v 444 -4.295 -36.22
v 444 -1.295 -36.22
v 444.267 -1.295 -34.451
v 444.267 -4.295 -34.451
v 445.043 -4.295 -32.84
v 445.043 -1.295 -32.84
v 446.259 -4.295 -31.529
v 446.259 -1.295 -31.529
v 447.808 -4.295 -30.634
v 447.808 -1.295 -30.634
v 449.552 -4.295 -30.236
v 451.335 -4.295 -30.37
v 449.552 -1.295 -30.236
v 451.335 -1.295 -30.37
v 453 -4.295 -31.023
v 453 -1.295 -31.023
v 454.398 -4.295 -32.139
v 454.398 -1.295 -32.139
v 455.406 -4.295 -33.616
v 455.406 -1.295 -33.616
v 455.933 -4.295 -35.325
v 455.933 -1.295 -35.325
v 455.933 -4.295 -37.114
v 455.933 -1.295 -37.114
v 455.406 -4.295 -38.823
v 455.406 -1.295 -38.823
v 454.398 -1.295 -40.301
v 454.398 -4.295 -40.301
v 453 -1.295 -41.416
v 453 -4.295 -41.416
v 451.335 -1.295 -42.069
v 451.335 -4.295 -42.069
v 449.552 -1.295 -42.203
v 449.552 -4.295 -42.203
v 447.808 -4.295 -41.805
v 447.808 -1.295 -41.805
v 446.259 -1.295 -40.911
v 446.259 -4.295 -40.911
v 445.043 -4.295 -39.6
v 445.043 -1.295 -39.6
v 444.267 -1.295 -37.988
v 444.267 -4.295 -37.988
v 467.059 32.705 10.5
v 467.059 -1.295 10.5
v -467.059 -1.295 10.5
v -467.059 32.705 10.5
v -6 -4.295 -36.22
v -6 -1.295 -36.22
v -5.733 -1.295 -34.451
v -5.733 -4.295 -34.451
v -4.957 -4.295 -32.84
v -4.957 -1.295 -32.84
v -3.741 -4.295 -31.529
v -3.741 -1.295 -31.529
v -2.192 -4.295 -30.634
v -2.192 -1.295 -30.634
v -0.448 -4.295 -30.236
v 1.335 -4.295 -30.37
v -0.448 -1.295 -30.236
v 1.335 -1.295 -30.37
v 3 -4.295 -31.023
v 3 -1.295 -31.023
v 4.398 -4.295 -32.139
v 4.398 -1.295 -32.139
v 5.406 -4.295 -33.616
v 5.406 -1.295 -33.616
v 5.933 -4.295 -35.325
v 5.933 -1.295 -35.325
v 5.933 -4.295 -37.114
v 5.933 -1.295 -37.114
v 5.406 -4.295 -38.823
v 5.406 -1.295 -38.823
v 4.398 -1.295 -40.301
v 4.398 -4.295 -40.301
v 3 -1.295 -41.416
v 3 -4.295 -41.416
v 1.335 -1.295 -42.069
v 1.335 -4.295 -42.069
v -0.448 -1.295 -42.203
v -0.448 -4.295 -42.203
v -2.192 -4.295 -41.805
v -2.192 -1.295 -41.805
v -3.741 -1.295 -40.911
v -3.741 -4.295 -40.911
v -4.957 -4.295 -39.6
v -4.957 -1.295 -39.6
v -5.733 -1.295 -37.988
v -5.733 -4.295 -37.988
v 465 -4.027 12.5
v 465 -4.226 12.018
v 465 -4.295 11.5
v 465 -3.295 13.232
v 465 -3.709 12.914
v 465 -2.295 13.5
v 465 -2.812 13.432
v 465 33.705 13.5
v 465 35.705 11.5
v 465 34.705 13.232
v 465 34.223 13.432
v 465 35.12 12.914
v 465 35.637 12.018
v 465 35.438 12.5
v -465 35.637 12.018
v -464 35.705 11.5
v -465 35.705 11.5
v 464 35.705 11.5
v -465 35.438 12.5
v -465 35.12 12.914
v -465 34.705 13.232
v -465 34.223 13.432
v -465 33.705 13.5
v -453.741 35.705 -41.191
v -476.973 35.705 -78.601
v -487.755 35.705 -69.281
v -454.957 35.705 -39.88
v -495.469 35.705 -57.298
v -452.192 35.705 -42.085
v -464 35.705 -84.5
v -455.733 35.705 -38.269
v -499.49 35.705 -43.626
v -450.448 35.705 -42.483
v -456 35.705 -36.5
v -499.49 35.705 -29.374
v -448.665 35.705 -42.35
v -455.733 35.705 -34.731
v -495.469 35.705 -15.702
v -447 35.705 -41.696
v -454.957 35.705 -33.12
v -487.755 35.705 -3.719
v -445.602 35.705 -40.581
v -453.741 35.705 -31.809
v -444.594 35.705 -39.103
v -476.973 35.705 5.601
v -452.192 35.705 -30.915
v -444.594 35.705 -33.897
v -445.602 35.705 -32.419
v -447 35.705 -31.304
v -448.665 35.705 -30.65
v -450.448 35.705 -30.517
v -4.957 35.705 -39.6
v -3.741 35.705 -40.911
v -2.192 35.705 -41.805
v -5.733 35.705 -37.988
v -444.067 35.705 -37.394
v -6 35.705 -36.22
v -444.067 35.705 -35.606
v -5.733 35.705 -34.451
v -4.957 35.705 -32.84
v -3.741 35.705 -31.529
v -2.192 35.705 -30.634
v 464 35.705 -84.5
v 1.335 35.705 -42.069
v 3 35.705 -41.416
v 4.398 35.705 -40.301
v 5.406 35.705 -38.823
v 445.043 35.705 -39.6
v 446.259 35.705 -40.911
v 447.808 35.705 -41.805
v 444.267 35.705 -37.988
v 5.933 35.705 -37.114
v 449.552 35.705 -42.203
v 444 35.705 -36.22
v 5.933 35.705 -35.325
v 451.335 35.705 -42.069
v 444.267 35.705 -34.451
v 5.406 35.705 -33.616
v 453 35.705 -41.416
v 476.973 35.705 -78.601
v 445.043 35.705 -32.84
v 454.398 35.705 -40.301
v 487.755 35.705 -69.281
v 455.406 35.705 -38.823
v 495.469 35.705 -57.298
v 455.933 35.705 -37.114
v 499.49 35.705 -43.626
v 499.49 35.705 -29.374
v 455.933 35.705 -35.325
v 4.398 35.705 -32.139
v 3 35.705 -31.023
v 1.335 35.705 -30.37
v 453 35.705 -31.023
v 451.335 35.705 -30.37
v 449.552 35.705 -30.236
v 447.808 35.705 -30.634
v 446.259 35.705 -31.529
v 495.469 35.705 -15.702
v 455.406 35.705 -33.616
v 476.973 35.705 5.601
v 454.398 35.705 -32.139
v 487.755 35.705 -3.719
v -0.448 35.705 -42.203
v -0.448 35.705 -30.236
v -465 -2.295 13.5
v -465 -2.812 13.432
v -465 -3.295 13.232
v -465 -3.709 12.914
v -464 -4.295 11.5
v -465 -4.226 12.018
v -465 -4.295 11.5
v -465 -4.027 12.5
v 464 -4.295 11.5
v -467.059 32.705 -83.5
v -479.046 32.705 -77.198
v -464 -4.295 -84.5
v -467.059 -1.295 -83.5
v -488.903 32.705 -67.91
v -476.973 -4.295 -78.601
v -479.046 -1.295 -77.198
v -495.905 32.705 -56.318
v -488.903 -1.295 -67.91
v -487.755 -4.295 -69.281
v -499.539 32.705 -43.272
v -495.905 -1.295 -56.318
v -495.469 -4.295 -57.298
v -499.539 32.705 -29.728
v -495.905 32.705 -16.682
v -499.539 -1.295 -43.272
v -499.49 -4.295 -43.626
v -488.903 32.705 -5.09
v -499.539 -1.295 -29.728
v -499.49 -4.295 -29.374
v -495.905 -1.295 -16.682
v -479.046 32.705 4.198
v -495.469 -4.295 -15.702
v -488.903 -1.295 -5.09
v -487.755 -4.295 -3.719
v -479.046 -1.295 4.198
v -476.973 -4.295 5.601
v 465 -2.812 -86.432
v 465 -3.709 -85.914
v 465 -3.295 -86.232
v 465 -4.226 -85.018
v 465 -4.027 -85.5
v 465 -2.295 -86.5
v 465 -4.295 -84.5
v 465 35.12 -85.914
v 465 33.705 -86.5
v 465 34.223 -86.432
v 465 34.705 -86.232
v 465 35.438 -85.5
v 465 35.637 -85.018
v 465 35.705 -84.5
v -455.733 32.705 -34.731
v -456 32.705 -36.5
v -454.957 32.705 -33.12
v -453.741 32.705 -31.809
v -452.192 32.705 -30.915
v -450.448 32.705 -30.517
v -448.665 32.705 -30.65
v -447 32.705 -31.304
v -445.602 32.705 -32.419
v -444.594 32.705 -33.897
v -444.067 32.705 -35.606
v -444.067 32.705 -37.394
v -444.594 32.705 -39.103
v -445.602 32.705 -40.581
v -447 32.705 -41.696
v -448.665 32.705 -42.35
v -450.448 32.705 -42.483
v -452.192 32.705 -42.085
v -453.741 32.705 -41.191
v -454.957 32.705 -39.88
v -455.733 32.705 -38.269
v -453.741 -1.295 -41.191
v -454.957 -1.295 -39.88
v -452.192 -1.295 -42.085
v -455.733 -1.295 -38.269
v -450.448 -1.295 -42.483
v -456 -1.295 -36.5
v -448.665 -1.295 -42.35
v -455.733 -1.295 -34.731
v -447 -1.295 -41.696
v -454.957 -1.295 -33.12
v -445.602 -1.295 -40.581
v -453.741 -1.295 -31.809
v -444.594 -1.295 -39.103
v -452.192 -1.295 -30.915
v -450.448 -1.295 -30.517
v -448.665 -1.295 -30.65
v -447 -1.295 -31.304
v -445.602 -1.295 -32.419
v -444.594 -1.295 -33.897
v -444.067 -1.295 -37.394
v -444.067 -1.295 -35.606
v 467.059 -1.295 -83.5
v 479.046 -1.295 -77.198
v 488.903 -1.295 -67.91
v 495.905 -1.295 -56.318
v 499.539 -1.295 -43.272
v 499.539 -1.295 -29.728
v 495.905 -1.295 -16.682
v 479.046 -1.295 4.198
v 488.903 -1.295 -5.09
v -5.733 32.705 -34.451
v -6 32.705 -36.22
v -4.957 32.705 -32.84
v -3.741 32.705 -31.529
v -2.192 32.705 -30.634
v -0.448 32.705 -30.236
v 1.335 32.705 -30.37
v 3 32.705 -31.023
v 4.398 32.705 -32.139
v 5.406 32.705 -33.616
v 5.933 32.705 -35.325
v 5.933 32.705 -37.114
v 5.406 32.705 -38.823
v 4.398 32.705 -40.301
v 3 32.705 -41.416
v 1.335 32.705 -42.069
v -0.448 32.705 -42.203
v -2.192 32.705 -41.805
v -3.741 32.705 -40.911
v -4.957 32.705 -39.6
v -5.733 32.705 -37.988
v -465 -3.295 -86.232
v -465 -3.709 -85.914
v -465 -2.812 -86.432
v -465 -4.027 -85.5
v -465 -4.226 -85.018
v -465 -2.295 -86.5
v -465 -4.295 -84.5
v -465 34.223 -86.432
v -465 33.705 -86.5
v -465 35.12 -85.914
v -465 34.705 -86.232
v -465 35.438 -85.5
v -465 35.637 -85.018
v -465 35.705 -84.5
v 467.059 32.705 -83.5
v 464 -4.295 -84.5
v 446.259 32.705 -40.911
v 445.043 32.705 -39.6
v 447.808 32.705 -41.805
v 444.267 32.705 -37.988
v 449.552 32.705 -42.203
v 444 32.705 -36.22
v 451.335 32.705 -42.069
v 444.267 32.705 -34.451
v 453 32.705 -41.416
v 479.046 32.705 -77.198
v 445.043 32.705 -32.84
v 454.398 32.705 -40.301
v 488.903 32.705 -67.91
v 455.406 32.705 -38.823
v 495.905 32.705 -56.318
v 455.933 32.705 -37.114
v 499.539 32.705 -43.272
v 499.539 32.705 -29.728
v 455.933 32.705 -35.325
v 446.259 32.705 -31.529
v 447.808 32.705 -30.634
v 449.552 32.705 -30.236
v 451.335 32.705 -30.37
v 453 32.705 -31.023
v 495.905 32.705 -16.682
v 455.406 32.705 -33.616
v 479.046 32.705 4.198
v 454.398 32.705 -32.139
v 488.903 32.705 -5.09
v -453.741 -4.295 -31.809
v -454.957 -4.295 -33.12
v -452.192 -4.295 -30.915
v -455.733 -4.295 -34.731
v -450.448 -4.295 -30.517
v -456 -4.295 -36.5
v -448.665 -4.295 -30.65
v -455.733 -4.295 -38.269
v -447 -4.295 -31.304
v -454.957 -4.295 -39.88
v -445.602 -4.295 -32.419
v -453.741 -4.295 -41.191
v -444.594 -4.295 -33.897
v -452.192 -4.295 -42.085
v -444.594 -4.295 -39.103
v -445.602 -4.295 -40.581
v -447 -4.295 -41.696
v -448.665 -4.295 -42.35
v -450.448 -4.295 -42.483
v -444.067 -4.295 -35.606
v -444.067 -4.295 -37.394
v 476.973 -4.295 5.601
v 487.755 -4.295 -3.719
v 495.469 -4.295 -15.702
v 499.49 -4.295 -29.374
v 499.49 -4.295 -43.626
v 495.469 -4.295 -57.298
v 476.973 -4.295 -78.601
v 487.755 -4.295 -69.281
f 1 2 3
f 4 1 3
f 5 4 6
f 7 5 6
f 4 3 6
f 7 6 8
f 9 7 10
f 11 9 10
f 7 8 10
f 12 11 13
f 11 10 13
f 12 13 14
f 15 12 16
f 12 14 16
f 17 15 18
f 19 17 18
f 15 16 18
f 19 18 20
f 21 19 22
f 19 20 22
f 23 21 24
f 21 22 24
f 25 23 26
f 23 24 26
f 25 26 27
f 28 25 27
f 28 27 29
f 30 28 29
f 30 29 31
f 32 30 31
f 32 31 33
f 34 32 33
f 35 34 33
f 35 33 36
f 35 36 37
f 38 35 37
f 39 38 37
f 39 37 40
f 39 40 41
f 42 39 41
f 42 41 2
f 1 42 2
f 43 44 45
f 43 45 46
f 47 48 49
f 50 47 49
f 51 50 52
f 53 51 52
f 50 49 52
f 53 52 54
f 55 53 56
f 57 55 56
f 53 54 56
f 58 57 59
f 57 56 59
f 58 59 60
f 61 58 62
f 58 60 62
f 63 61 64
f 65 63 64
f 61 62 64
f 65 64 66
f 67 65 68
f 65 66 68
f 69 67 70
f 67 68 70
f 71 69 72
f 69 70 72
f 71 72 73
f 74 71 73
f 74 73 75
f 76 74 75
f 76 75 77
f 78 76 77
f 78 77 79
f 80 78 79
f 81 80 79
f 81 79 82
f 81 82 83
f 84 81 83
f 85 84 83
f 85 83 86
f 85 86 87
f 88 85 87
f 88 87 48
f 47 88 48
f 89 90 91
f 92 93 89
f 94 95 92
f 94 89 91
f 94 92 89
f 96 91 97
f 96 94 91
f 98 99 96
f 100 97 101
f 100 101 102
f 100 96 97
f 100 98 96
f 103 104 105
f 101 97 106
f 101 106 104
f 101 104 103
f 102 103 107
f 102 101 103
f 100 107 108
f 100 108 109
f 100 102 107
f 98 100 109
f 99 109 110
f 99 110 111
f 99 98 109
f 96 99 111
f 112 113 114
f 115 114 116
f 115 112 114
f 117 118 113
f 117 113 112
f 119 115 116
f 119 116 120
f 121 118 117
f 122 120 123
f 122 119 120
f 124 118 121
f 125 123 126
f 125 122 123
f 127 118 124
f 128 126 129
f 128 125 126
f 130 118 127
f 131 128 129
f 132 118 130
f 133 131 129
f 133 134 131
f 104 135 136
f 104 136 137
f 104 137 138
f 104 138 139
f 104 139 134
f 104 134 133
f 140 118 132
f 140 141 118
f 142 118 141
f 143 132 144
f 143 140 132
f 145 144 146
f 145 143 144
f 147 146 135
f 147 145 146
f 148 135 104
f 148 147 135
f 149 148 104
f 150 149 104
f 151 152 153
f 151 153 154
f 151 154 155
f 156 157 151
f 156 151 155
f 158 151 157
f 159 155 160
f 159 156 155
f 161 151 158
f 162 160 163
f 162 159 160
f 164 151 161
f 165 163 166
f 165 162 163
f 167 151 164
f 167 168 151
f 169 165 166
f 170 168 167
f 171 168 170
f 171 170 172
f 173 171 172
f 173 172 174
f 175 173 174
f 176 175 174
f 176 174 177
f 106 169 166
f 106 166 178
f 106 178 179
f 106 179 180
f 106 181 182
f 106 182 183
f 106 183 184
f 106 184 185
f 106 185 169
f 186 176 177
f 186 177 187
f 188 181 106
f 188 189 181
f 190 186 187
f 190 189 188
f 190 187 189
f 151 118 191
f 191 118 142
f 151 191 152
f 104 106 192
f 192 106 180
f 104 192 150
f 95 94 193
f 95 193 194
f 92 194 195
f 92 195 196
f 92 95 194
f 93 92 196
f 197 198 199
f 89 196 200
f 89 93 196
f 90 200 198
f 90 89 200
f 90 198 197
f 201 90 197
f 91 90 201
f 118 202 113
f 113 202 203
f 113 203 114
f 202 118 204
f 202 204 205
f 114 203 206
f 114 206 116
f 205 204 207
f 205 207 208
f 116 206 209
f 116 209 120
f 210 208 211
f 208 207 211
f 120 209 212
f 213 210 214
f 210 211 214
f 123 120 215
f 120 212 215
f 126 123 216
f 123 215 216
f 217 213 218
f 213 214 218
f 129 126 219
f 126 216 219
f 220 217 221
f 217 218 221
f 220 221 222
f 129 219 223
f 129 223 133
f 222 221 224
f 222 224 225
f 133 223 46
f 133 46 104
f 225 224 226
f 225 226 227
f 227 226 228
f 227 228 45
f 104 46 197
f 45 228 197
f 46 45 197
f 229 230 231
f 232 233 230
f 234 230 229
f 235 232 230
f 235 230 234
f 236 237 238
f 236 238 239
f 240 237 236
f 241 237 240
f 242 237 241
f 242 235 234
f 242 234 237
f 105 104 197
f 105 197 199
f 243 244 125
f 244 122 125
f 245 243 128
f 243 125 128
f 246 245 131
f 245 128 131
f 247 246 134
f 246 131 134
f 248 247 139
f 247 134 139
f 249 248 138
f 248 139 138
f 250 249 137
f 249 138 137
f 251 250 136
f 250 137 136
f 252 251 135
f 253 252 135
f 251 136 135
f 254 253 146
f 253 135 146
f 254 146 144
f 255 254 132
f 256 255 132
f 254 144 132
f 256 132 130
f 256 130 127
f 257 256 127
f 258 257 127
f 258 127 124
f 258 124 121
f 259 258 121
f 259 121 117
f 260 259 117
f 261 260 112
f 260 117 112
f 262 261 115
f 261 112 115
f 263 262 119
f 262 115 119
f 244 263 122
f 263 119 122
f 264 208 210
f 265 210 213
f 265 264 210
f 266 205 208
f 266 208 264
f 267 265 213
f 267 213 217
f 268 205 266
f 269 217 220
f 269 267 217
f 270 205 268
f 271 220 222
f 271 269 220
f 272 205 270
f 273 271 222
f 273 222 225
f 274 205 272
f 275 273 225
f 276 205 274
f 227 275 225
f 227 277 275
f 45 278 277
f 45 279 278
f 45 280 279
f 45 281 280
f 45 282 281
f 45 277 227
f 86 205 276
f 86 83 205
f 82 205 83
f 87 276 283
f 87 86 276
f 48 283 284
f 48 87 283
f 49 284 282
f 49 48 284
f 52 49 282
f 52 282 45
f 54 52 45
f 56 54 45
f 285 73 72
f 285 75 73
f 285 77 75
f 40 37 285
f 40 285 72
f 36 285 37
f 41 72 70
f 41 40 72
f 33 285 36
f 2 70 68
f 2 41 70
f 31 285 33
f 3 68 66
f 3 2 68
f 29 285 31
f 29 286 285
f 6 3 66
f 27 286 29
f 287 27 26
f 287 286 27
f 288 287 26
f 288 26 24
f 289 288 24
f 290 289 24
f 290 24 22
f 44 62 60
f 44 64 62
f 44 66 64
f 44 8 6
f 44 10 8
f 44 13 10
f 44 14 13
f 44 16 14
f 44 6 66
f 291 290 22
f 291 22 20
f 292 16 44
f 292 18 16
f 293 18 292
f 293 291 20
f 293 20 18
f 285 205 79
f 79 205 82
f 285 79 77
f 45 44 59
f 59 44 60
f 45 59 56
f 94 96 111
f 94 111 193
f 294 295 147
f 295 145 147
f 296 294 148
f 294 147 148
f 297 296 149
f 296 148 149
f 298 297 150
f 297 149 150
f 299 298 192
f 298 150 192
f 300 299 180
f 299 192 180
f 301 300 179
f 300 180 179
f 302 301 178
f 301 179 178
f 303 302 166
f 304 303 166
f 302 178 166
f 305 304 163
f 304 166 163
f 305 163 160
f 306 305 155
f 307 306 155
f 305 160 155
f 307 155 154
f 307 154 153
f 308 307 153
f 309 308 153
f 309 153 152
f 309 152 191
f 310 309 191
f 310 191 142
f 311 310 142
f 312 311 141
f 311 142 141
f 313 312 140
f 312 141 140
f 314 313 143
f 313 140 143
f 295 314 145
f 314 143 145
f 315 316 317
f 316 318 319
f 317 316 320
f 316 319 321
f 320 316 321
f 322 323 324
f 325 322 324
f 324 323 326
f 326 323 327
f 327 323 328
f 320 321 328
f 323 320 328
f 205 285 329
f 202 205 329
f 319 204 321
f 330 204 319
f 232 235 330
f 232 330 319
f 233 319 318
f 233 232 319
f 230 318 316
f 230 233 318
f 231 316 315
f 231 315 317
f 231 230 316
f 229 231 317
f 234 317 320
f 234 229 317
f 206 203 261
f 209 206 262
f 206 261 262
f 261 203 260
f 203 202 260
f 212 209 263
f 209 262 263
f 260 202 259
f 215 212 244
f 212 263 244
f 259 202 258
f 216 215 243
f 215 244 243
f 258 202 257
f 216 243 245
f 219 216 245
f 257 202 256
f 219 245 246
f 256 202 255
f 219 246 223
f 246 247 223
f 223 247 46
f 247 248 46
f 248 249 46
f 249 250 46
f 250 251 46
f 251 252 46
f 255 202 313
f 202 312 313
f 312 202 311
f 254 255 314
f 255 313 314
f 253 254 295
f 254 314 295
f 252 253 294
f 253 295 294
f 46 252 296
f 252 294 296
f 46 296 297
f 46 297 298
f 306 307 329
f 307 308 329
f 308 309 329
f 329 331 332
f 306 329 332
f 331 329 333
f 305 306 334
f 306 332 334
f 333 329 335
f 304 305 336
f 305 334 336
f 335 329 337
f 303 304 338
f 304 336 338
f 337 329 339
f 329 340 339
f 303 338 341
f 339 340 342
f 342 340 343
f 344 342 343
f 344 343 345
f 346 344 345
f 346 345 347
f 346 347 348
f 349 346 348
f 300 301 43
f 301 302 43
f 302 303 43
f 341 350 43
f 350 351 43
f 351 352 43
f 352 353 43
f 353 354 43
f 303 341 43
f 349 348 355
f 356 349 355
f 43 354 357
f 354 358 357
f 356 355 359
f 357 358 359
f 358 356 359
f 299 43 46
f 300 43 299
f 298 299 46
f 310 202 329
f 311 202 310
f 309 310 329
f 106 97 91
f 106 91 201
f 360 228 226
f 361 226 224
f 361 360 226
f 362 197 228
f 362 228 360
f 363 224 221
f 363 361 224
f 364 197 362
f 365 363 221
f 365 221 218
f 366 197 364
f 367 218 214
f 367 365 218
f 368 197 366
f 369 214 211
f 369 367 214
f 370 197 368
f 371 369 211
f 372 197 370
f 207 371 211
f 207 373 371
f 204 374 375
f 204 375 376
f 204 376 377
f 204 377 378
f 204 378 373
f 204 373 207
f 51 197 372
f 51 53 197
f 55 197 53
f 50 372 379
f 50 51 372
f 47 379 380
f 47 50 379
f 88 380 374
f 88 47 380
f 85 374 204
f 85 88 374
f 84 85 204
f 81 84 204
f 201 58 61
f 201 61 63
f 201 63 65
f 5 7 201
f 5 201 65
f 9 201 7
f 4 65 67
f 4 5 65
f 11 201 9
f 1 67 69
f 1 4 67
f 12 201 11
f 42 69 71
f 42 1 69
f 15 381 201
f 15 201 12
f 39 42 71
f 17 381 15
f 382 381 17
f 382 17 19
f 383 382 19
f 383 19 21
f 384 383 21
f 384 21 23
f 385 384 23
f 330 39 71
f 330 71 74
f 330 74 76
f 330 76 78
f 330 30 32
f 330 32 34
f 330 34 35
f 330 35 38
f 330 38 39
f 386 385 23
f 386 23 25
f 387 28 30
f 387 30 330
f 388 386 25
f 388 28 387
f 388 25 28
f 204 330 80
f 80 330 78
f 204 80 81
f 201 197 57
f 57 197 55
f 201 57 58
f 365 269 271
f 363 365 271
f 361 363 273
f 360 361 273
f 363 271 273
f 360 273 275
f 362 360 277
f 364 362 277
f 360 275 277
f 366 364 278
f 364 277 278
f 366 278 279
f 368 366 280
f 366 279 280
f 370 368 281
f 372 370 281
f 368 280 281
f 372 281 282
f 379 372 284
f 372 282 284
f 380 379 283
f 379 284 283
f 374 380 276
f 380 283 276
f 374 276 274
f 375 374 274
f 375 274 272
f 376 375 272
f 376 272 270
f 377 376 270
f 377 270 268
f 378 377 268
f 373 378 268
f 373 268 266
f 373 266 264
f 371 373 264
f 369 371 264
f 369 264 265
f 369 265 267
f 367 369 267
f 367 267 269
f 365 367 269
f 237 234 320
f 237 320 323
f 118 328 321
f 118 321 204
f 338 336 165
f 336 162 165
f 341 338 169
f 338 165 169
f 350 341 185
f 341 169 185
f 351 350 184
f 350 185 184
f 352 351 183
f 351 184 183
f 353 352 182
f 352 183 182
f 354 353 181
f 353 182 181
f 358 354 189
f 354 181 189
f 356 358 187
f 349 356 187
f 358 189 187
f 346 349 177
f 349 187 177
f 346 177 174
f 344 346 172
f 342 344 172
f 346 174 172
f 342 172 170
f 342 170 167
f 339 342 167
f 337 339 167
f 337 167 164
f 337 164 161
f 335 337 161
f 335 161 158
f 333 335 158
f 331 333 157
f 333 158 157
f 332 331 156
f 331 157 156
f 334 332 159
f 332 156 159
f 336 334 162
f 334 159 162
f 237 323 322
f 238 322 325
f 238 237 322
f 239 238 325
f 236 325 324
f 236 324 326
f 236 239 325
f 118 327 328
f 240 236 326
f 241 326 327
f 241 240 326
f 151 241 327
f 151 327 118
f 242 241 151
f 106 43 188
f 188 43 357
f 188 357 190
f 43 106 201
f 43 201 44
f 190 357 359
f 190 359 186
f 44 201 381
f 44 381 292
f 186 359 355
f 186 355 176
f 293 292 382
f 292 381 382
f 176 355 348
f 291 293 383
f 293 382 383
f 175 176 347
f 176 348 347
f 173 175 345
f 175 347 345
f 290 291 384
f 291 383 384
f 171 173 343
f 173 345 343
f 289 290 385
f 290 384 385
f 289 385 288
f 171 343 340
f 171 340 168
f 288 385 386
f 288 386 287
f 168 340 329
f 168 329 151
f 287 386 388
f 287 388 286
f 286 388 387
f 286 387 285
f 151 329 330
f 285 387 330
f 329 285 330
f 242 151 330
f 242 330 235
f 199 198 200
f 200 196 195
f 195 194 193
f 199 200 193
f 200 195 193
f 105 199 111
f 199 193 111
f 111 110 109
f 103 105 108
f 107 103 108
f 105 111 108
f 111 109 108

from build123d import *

# Parameters (mm, degrees)
F3_W     = 34
F3_H     = 94
F4_DEPTH = 500
F6_D     = 12
F6_DEPTH = 40
F6_TIP   = 3.6051637142
F7_DEPTH = 40
F8_DEPTH = 35
F9_DEPTH = 35


# Not quite as in the source:
# - a feature names something its author has since deleted; it is built from what else it names


with BuildPart() as f4:
    # F3 (on Right) → F4 (new body, symmetric)
    with BuildSketch(Plane.YZ):
        with BuildLine():
            ThreePointArc((-4.2945303673, -84.5), (-3.7087439297, -85.9142135624), (-2.2945303673, -86.5))
            Line((-2.2945303673, -86.5), (33.7054696327, -86.5))
            ThreePointArc((33.7054696327, -86.5), (35.1196831951, -85.9142135624), (35.7054696327, -84.5))
            Line((35.7054696327, -84.5), (35.7054696327, 11.5))
            ThreePointArc((35.7054696327, 11.5), (35.1196831951, 12.9142135624), (33.7054696327, 13.5))
            Line((33.7054696327, 13.5), (-2.2945303673, 13.5))
            ThreePointArc((-2.2945303673, 13.5), (-3.7087439297, 12.9142135624), (-4.2945303673, 11.5))
            Line((-4.2945303673, 11.5), (-4.2945303673, -84.5))
        make_face()
        with Locations((15.7054696327, -36.5)):
            Rectangle(F3_W, F3_H, mode=Mode.SUBTRACT)
    extrude(amount=F4_DEPTH, both=True)

    # F6
    with Locations(Plane.XZ.offset(4.2945303673)):
        with Locations((450, -36.2195856869), (0, -36.2195856869), (-450, -36.5)):
            Hole(F6_D / 2, depth=F6_DEPTH)
            with Locations((0, 0, -(F6_DEPTH + F6_TIP / 2))):  # 118° drill point
                Cone(0, F6_D / 2, F6_TIP, mode=Mode.SUBTRACT)

    # F5 (on face) → F7 (cut)
    with BuildSketch(Plane.XZ.offset(4.2945303673)):
        with BuildLine():
            ThreePointArc((-500, -36.5), (-490, -6.5), (-464, 11.5))
            Line((-464, 11.5), (-500, 11.5))
            Line((-500, 11.5), (-500, -36.5))
        make_face()
        with BuildLine():
            ThreePointArc((-464, -84.5), (-490, -66.5), (-500, -36.5))
            Line((-500, -36.5), (-500, -84.5))
            Line((-500, -84.5), (-464, -84.5))
        make_face()
        with BuildLine():
            Line((500, 11.5), (464, 11.5))
            ThreePointArc((464, 11.5), (490, -6.5), (500, -36.5))
            Line((500, -36.5), (500, 11.5))
        make_face()
        with BuildLine():
            Line((500, -84.5), (500, -36.5))
            ThreePointArc((500, -36.5), (490, -66.5), (464, -84.5))
            Line((464, -84.5), (500, -84.5))
        make_face()
    extrude(amount=-F7_DEPTH, mode=Mode.SUBTRACT)

    # F8 (cut): faces of the model
    f8_faces = [f4.faces().sort_by_distance(p)[0] for p in [
        (-500, 15.7054696327, 12.4878664624),
        (-500, 15.7054696327, -85.4878664624),
    ]]
    extrude(f8_faces, amount=-F8_DEPTH, mode=Mode.SUBTRACT)

    # F9 (cut): faces of the model
    f9_faces = [f4.faces().sort_by_distance(p)[0] for p in [
        (500, 15.7054696327, -85.4878664624),
        (500, 15.7054696327, 12.4878664624),
    ]]
    extrude(f9_faces, amount=-F9_DEPTH, mode=Mode.SUBTRACT)


solid = f4.part
